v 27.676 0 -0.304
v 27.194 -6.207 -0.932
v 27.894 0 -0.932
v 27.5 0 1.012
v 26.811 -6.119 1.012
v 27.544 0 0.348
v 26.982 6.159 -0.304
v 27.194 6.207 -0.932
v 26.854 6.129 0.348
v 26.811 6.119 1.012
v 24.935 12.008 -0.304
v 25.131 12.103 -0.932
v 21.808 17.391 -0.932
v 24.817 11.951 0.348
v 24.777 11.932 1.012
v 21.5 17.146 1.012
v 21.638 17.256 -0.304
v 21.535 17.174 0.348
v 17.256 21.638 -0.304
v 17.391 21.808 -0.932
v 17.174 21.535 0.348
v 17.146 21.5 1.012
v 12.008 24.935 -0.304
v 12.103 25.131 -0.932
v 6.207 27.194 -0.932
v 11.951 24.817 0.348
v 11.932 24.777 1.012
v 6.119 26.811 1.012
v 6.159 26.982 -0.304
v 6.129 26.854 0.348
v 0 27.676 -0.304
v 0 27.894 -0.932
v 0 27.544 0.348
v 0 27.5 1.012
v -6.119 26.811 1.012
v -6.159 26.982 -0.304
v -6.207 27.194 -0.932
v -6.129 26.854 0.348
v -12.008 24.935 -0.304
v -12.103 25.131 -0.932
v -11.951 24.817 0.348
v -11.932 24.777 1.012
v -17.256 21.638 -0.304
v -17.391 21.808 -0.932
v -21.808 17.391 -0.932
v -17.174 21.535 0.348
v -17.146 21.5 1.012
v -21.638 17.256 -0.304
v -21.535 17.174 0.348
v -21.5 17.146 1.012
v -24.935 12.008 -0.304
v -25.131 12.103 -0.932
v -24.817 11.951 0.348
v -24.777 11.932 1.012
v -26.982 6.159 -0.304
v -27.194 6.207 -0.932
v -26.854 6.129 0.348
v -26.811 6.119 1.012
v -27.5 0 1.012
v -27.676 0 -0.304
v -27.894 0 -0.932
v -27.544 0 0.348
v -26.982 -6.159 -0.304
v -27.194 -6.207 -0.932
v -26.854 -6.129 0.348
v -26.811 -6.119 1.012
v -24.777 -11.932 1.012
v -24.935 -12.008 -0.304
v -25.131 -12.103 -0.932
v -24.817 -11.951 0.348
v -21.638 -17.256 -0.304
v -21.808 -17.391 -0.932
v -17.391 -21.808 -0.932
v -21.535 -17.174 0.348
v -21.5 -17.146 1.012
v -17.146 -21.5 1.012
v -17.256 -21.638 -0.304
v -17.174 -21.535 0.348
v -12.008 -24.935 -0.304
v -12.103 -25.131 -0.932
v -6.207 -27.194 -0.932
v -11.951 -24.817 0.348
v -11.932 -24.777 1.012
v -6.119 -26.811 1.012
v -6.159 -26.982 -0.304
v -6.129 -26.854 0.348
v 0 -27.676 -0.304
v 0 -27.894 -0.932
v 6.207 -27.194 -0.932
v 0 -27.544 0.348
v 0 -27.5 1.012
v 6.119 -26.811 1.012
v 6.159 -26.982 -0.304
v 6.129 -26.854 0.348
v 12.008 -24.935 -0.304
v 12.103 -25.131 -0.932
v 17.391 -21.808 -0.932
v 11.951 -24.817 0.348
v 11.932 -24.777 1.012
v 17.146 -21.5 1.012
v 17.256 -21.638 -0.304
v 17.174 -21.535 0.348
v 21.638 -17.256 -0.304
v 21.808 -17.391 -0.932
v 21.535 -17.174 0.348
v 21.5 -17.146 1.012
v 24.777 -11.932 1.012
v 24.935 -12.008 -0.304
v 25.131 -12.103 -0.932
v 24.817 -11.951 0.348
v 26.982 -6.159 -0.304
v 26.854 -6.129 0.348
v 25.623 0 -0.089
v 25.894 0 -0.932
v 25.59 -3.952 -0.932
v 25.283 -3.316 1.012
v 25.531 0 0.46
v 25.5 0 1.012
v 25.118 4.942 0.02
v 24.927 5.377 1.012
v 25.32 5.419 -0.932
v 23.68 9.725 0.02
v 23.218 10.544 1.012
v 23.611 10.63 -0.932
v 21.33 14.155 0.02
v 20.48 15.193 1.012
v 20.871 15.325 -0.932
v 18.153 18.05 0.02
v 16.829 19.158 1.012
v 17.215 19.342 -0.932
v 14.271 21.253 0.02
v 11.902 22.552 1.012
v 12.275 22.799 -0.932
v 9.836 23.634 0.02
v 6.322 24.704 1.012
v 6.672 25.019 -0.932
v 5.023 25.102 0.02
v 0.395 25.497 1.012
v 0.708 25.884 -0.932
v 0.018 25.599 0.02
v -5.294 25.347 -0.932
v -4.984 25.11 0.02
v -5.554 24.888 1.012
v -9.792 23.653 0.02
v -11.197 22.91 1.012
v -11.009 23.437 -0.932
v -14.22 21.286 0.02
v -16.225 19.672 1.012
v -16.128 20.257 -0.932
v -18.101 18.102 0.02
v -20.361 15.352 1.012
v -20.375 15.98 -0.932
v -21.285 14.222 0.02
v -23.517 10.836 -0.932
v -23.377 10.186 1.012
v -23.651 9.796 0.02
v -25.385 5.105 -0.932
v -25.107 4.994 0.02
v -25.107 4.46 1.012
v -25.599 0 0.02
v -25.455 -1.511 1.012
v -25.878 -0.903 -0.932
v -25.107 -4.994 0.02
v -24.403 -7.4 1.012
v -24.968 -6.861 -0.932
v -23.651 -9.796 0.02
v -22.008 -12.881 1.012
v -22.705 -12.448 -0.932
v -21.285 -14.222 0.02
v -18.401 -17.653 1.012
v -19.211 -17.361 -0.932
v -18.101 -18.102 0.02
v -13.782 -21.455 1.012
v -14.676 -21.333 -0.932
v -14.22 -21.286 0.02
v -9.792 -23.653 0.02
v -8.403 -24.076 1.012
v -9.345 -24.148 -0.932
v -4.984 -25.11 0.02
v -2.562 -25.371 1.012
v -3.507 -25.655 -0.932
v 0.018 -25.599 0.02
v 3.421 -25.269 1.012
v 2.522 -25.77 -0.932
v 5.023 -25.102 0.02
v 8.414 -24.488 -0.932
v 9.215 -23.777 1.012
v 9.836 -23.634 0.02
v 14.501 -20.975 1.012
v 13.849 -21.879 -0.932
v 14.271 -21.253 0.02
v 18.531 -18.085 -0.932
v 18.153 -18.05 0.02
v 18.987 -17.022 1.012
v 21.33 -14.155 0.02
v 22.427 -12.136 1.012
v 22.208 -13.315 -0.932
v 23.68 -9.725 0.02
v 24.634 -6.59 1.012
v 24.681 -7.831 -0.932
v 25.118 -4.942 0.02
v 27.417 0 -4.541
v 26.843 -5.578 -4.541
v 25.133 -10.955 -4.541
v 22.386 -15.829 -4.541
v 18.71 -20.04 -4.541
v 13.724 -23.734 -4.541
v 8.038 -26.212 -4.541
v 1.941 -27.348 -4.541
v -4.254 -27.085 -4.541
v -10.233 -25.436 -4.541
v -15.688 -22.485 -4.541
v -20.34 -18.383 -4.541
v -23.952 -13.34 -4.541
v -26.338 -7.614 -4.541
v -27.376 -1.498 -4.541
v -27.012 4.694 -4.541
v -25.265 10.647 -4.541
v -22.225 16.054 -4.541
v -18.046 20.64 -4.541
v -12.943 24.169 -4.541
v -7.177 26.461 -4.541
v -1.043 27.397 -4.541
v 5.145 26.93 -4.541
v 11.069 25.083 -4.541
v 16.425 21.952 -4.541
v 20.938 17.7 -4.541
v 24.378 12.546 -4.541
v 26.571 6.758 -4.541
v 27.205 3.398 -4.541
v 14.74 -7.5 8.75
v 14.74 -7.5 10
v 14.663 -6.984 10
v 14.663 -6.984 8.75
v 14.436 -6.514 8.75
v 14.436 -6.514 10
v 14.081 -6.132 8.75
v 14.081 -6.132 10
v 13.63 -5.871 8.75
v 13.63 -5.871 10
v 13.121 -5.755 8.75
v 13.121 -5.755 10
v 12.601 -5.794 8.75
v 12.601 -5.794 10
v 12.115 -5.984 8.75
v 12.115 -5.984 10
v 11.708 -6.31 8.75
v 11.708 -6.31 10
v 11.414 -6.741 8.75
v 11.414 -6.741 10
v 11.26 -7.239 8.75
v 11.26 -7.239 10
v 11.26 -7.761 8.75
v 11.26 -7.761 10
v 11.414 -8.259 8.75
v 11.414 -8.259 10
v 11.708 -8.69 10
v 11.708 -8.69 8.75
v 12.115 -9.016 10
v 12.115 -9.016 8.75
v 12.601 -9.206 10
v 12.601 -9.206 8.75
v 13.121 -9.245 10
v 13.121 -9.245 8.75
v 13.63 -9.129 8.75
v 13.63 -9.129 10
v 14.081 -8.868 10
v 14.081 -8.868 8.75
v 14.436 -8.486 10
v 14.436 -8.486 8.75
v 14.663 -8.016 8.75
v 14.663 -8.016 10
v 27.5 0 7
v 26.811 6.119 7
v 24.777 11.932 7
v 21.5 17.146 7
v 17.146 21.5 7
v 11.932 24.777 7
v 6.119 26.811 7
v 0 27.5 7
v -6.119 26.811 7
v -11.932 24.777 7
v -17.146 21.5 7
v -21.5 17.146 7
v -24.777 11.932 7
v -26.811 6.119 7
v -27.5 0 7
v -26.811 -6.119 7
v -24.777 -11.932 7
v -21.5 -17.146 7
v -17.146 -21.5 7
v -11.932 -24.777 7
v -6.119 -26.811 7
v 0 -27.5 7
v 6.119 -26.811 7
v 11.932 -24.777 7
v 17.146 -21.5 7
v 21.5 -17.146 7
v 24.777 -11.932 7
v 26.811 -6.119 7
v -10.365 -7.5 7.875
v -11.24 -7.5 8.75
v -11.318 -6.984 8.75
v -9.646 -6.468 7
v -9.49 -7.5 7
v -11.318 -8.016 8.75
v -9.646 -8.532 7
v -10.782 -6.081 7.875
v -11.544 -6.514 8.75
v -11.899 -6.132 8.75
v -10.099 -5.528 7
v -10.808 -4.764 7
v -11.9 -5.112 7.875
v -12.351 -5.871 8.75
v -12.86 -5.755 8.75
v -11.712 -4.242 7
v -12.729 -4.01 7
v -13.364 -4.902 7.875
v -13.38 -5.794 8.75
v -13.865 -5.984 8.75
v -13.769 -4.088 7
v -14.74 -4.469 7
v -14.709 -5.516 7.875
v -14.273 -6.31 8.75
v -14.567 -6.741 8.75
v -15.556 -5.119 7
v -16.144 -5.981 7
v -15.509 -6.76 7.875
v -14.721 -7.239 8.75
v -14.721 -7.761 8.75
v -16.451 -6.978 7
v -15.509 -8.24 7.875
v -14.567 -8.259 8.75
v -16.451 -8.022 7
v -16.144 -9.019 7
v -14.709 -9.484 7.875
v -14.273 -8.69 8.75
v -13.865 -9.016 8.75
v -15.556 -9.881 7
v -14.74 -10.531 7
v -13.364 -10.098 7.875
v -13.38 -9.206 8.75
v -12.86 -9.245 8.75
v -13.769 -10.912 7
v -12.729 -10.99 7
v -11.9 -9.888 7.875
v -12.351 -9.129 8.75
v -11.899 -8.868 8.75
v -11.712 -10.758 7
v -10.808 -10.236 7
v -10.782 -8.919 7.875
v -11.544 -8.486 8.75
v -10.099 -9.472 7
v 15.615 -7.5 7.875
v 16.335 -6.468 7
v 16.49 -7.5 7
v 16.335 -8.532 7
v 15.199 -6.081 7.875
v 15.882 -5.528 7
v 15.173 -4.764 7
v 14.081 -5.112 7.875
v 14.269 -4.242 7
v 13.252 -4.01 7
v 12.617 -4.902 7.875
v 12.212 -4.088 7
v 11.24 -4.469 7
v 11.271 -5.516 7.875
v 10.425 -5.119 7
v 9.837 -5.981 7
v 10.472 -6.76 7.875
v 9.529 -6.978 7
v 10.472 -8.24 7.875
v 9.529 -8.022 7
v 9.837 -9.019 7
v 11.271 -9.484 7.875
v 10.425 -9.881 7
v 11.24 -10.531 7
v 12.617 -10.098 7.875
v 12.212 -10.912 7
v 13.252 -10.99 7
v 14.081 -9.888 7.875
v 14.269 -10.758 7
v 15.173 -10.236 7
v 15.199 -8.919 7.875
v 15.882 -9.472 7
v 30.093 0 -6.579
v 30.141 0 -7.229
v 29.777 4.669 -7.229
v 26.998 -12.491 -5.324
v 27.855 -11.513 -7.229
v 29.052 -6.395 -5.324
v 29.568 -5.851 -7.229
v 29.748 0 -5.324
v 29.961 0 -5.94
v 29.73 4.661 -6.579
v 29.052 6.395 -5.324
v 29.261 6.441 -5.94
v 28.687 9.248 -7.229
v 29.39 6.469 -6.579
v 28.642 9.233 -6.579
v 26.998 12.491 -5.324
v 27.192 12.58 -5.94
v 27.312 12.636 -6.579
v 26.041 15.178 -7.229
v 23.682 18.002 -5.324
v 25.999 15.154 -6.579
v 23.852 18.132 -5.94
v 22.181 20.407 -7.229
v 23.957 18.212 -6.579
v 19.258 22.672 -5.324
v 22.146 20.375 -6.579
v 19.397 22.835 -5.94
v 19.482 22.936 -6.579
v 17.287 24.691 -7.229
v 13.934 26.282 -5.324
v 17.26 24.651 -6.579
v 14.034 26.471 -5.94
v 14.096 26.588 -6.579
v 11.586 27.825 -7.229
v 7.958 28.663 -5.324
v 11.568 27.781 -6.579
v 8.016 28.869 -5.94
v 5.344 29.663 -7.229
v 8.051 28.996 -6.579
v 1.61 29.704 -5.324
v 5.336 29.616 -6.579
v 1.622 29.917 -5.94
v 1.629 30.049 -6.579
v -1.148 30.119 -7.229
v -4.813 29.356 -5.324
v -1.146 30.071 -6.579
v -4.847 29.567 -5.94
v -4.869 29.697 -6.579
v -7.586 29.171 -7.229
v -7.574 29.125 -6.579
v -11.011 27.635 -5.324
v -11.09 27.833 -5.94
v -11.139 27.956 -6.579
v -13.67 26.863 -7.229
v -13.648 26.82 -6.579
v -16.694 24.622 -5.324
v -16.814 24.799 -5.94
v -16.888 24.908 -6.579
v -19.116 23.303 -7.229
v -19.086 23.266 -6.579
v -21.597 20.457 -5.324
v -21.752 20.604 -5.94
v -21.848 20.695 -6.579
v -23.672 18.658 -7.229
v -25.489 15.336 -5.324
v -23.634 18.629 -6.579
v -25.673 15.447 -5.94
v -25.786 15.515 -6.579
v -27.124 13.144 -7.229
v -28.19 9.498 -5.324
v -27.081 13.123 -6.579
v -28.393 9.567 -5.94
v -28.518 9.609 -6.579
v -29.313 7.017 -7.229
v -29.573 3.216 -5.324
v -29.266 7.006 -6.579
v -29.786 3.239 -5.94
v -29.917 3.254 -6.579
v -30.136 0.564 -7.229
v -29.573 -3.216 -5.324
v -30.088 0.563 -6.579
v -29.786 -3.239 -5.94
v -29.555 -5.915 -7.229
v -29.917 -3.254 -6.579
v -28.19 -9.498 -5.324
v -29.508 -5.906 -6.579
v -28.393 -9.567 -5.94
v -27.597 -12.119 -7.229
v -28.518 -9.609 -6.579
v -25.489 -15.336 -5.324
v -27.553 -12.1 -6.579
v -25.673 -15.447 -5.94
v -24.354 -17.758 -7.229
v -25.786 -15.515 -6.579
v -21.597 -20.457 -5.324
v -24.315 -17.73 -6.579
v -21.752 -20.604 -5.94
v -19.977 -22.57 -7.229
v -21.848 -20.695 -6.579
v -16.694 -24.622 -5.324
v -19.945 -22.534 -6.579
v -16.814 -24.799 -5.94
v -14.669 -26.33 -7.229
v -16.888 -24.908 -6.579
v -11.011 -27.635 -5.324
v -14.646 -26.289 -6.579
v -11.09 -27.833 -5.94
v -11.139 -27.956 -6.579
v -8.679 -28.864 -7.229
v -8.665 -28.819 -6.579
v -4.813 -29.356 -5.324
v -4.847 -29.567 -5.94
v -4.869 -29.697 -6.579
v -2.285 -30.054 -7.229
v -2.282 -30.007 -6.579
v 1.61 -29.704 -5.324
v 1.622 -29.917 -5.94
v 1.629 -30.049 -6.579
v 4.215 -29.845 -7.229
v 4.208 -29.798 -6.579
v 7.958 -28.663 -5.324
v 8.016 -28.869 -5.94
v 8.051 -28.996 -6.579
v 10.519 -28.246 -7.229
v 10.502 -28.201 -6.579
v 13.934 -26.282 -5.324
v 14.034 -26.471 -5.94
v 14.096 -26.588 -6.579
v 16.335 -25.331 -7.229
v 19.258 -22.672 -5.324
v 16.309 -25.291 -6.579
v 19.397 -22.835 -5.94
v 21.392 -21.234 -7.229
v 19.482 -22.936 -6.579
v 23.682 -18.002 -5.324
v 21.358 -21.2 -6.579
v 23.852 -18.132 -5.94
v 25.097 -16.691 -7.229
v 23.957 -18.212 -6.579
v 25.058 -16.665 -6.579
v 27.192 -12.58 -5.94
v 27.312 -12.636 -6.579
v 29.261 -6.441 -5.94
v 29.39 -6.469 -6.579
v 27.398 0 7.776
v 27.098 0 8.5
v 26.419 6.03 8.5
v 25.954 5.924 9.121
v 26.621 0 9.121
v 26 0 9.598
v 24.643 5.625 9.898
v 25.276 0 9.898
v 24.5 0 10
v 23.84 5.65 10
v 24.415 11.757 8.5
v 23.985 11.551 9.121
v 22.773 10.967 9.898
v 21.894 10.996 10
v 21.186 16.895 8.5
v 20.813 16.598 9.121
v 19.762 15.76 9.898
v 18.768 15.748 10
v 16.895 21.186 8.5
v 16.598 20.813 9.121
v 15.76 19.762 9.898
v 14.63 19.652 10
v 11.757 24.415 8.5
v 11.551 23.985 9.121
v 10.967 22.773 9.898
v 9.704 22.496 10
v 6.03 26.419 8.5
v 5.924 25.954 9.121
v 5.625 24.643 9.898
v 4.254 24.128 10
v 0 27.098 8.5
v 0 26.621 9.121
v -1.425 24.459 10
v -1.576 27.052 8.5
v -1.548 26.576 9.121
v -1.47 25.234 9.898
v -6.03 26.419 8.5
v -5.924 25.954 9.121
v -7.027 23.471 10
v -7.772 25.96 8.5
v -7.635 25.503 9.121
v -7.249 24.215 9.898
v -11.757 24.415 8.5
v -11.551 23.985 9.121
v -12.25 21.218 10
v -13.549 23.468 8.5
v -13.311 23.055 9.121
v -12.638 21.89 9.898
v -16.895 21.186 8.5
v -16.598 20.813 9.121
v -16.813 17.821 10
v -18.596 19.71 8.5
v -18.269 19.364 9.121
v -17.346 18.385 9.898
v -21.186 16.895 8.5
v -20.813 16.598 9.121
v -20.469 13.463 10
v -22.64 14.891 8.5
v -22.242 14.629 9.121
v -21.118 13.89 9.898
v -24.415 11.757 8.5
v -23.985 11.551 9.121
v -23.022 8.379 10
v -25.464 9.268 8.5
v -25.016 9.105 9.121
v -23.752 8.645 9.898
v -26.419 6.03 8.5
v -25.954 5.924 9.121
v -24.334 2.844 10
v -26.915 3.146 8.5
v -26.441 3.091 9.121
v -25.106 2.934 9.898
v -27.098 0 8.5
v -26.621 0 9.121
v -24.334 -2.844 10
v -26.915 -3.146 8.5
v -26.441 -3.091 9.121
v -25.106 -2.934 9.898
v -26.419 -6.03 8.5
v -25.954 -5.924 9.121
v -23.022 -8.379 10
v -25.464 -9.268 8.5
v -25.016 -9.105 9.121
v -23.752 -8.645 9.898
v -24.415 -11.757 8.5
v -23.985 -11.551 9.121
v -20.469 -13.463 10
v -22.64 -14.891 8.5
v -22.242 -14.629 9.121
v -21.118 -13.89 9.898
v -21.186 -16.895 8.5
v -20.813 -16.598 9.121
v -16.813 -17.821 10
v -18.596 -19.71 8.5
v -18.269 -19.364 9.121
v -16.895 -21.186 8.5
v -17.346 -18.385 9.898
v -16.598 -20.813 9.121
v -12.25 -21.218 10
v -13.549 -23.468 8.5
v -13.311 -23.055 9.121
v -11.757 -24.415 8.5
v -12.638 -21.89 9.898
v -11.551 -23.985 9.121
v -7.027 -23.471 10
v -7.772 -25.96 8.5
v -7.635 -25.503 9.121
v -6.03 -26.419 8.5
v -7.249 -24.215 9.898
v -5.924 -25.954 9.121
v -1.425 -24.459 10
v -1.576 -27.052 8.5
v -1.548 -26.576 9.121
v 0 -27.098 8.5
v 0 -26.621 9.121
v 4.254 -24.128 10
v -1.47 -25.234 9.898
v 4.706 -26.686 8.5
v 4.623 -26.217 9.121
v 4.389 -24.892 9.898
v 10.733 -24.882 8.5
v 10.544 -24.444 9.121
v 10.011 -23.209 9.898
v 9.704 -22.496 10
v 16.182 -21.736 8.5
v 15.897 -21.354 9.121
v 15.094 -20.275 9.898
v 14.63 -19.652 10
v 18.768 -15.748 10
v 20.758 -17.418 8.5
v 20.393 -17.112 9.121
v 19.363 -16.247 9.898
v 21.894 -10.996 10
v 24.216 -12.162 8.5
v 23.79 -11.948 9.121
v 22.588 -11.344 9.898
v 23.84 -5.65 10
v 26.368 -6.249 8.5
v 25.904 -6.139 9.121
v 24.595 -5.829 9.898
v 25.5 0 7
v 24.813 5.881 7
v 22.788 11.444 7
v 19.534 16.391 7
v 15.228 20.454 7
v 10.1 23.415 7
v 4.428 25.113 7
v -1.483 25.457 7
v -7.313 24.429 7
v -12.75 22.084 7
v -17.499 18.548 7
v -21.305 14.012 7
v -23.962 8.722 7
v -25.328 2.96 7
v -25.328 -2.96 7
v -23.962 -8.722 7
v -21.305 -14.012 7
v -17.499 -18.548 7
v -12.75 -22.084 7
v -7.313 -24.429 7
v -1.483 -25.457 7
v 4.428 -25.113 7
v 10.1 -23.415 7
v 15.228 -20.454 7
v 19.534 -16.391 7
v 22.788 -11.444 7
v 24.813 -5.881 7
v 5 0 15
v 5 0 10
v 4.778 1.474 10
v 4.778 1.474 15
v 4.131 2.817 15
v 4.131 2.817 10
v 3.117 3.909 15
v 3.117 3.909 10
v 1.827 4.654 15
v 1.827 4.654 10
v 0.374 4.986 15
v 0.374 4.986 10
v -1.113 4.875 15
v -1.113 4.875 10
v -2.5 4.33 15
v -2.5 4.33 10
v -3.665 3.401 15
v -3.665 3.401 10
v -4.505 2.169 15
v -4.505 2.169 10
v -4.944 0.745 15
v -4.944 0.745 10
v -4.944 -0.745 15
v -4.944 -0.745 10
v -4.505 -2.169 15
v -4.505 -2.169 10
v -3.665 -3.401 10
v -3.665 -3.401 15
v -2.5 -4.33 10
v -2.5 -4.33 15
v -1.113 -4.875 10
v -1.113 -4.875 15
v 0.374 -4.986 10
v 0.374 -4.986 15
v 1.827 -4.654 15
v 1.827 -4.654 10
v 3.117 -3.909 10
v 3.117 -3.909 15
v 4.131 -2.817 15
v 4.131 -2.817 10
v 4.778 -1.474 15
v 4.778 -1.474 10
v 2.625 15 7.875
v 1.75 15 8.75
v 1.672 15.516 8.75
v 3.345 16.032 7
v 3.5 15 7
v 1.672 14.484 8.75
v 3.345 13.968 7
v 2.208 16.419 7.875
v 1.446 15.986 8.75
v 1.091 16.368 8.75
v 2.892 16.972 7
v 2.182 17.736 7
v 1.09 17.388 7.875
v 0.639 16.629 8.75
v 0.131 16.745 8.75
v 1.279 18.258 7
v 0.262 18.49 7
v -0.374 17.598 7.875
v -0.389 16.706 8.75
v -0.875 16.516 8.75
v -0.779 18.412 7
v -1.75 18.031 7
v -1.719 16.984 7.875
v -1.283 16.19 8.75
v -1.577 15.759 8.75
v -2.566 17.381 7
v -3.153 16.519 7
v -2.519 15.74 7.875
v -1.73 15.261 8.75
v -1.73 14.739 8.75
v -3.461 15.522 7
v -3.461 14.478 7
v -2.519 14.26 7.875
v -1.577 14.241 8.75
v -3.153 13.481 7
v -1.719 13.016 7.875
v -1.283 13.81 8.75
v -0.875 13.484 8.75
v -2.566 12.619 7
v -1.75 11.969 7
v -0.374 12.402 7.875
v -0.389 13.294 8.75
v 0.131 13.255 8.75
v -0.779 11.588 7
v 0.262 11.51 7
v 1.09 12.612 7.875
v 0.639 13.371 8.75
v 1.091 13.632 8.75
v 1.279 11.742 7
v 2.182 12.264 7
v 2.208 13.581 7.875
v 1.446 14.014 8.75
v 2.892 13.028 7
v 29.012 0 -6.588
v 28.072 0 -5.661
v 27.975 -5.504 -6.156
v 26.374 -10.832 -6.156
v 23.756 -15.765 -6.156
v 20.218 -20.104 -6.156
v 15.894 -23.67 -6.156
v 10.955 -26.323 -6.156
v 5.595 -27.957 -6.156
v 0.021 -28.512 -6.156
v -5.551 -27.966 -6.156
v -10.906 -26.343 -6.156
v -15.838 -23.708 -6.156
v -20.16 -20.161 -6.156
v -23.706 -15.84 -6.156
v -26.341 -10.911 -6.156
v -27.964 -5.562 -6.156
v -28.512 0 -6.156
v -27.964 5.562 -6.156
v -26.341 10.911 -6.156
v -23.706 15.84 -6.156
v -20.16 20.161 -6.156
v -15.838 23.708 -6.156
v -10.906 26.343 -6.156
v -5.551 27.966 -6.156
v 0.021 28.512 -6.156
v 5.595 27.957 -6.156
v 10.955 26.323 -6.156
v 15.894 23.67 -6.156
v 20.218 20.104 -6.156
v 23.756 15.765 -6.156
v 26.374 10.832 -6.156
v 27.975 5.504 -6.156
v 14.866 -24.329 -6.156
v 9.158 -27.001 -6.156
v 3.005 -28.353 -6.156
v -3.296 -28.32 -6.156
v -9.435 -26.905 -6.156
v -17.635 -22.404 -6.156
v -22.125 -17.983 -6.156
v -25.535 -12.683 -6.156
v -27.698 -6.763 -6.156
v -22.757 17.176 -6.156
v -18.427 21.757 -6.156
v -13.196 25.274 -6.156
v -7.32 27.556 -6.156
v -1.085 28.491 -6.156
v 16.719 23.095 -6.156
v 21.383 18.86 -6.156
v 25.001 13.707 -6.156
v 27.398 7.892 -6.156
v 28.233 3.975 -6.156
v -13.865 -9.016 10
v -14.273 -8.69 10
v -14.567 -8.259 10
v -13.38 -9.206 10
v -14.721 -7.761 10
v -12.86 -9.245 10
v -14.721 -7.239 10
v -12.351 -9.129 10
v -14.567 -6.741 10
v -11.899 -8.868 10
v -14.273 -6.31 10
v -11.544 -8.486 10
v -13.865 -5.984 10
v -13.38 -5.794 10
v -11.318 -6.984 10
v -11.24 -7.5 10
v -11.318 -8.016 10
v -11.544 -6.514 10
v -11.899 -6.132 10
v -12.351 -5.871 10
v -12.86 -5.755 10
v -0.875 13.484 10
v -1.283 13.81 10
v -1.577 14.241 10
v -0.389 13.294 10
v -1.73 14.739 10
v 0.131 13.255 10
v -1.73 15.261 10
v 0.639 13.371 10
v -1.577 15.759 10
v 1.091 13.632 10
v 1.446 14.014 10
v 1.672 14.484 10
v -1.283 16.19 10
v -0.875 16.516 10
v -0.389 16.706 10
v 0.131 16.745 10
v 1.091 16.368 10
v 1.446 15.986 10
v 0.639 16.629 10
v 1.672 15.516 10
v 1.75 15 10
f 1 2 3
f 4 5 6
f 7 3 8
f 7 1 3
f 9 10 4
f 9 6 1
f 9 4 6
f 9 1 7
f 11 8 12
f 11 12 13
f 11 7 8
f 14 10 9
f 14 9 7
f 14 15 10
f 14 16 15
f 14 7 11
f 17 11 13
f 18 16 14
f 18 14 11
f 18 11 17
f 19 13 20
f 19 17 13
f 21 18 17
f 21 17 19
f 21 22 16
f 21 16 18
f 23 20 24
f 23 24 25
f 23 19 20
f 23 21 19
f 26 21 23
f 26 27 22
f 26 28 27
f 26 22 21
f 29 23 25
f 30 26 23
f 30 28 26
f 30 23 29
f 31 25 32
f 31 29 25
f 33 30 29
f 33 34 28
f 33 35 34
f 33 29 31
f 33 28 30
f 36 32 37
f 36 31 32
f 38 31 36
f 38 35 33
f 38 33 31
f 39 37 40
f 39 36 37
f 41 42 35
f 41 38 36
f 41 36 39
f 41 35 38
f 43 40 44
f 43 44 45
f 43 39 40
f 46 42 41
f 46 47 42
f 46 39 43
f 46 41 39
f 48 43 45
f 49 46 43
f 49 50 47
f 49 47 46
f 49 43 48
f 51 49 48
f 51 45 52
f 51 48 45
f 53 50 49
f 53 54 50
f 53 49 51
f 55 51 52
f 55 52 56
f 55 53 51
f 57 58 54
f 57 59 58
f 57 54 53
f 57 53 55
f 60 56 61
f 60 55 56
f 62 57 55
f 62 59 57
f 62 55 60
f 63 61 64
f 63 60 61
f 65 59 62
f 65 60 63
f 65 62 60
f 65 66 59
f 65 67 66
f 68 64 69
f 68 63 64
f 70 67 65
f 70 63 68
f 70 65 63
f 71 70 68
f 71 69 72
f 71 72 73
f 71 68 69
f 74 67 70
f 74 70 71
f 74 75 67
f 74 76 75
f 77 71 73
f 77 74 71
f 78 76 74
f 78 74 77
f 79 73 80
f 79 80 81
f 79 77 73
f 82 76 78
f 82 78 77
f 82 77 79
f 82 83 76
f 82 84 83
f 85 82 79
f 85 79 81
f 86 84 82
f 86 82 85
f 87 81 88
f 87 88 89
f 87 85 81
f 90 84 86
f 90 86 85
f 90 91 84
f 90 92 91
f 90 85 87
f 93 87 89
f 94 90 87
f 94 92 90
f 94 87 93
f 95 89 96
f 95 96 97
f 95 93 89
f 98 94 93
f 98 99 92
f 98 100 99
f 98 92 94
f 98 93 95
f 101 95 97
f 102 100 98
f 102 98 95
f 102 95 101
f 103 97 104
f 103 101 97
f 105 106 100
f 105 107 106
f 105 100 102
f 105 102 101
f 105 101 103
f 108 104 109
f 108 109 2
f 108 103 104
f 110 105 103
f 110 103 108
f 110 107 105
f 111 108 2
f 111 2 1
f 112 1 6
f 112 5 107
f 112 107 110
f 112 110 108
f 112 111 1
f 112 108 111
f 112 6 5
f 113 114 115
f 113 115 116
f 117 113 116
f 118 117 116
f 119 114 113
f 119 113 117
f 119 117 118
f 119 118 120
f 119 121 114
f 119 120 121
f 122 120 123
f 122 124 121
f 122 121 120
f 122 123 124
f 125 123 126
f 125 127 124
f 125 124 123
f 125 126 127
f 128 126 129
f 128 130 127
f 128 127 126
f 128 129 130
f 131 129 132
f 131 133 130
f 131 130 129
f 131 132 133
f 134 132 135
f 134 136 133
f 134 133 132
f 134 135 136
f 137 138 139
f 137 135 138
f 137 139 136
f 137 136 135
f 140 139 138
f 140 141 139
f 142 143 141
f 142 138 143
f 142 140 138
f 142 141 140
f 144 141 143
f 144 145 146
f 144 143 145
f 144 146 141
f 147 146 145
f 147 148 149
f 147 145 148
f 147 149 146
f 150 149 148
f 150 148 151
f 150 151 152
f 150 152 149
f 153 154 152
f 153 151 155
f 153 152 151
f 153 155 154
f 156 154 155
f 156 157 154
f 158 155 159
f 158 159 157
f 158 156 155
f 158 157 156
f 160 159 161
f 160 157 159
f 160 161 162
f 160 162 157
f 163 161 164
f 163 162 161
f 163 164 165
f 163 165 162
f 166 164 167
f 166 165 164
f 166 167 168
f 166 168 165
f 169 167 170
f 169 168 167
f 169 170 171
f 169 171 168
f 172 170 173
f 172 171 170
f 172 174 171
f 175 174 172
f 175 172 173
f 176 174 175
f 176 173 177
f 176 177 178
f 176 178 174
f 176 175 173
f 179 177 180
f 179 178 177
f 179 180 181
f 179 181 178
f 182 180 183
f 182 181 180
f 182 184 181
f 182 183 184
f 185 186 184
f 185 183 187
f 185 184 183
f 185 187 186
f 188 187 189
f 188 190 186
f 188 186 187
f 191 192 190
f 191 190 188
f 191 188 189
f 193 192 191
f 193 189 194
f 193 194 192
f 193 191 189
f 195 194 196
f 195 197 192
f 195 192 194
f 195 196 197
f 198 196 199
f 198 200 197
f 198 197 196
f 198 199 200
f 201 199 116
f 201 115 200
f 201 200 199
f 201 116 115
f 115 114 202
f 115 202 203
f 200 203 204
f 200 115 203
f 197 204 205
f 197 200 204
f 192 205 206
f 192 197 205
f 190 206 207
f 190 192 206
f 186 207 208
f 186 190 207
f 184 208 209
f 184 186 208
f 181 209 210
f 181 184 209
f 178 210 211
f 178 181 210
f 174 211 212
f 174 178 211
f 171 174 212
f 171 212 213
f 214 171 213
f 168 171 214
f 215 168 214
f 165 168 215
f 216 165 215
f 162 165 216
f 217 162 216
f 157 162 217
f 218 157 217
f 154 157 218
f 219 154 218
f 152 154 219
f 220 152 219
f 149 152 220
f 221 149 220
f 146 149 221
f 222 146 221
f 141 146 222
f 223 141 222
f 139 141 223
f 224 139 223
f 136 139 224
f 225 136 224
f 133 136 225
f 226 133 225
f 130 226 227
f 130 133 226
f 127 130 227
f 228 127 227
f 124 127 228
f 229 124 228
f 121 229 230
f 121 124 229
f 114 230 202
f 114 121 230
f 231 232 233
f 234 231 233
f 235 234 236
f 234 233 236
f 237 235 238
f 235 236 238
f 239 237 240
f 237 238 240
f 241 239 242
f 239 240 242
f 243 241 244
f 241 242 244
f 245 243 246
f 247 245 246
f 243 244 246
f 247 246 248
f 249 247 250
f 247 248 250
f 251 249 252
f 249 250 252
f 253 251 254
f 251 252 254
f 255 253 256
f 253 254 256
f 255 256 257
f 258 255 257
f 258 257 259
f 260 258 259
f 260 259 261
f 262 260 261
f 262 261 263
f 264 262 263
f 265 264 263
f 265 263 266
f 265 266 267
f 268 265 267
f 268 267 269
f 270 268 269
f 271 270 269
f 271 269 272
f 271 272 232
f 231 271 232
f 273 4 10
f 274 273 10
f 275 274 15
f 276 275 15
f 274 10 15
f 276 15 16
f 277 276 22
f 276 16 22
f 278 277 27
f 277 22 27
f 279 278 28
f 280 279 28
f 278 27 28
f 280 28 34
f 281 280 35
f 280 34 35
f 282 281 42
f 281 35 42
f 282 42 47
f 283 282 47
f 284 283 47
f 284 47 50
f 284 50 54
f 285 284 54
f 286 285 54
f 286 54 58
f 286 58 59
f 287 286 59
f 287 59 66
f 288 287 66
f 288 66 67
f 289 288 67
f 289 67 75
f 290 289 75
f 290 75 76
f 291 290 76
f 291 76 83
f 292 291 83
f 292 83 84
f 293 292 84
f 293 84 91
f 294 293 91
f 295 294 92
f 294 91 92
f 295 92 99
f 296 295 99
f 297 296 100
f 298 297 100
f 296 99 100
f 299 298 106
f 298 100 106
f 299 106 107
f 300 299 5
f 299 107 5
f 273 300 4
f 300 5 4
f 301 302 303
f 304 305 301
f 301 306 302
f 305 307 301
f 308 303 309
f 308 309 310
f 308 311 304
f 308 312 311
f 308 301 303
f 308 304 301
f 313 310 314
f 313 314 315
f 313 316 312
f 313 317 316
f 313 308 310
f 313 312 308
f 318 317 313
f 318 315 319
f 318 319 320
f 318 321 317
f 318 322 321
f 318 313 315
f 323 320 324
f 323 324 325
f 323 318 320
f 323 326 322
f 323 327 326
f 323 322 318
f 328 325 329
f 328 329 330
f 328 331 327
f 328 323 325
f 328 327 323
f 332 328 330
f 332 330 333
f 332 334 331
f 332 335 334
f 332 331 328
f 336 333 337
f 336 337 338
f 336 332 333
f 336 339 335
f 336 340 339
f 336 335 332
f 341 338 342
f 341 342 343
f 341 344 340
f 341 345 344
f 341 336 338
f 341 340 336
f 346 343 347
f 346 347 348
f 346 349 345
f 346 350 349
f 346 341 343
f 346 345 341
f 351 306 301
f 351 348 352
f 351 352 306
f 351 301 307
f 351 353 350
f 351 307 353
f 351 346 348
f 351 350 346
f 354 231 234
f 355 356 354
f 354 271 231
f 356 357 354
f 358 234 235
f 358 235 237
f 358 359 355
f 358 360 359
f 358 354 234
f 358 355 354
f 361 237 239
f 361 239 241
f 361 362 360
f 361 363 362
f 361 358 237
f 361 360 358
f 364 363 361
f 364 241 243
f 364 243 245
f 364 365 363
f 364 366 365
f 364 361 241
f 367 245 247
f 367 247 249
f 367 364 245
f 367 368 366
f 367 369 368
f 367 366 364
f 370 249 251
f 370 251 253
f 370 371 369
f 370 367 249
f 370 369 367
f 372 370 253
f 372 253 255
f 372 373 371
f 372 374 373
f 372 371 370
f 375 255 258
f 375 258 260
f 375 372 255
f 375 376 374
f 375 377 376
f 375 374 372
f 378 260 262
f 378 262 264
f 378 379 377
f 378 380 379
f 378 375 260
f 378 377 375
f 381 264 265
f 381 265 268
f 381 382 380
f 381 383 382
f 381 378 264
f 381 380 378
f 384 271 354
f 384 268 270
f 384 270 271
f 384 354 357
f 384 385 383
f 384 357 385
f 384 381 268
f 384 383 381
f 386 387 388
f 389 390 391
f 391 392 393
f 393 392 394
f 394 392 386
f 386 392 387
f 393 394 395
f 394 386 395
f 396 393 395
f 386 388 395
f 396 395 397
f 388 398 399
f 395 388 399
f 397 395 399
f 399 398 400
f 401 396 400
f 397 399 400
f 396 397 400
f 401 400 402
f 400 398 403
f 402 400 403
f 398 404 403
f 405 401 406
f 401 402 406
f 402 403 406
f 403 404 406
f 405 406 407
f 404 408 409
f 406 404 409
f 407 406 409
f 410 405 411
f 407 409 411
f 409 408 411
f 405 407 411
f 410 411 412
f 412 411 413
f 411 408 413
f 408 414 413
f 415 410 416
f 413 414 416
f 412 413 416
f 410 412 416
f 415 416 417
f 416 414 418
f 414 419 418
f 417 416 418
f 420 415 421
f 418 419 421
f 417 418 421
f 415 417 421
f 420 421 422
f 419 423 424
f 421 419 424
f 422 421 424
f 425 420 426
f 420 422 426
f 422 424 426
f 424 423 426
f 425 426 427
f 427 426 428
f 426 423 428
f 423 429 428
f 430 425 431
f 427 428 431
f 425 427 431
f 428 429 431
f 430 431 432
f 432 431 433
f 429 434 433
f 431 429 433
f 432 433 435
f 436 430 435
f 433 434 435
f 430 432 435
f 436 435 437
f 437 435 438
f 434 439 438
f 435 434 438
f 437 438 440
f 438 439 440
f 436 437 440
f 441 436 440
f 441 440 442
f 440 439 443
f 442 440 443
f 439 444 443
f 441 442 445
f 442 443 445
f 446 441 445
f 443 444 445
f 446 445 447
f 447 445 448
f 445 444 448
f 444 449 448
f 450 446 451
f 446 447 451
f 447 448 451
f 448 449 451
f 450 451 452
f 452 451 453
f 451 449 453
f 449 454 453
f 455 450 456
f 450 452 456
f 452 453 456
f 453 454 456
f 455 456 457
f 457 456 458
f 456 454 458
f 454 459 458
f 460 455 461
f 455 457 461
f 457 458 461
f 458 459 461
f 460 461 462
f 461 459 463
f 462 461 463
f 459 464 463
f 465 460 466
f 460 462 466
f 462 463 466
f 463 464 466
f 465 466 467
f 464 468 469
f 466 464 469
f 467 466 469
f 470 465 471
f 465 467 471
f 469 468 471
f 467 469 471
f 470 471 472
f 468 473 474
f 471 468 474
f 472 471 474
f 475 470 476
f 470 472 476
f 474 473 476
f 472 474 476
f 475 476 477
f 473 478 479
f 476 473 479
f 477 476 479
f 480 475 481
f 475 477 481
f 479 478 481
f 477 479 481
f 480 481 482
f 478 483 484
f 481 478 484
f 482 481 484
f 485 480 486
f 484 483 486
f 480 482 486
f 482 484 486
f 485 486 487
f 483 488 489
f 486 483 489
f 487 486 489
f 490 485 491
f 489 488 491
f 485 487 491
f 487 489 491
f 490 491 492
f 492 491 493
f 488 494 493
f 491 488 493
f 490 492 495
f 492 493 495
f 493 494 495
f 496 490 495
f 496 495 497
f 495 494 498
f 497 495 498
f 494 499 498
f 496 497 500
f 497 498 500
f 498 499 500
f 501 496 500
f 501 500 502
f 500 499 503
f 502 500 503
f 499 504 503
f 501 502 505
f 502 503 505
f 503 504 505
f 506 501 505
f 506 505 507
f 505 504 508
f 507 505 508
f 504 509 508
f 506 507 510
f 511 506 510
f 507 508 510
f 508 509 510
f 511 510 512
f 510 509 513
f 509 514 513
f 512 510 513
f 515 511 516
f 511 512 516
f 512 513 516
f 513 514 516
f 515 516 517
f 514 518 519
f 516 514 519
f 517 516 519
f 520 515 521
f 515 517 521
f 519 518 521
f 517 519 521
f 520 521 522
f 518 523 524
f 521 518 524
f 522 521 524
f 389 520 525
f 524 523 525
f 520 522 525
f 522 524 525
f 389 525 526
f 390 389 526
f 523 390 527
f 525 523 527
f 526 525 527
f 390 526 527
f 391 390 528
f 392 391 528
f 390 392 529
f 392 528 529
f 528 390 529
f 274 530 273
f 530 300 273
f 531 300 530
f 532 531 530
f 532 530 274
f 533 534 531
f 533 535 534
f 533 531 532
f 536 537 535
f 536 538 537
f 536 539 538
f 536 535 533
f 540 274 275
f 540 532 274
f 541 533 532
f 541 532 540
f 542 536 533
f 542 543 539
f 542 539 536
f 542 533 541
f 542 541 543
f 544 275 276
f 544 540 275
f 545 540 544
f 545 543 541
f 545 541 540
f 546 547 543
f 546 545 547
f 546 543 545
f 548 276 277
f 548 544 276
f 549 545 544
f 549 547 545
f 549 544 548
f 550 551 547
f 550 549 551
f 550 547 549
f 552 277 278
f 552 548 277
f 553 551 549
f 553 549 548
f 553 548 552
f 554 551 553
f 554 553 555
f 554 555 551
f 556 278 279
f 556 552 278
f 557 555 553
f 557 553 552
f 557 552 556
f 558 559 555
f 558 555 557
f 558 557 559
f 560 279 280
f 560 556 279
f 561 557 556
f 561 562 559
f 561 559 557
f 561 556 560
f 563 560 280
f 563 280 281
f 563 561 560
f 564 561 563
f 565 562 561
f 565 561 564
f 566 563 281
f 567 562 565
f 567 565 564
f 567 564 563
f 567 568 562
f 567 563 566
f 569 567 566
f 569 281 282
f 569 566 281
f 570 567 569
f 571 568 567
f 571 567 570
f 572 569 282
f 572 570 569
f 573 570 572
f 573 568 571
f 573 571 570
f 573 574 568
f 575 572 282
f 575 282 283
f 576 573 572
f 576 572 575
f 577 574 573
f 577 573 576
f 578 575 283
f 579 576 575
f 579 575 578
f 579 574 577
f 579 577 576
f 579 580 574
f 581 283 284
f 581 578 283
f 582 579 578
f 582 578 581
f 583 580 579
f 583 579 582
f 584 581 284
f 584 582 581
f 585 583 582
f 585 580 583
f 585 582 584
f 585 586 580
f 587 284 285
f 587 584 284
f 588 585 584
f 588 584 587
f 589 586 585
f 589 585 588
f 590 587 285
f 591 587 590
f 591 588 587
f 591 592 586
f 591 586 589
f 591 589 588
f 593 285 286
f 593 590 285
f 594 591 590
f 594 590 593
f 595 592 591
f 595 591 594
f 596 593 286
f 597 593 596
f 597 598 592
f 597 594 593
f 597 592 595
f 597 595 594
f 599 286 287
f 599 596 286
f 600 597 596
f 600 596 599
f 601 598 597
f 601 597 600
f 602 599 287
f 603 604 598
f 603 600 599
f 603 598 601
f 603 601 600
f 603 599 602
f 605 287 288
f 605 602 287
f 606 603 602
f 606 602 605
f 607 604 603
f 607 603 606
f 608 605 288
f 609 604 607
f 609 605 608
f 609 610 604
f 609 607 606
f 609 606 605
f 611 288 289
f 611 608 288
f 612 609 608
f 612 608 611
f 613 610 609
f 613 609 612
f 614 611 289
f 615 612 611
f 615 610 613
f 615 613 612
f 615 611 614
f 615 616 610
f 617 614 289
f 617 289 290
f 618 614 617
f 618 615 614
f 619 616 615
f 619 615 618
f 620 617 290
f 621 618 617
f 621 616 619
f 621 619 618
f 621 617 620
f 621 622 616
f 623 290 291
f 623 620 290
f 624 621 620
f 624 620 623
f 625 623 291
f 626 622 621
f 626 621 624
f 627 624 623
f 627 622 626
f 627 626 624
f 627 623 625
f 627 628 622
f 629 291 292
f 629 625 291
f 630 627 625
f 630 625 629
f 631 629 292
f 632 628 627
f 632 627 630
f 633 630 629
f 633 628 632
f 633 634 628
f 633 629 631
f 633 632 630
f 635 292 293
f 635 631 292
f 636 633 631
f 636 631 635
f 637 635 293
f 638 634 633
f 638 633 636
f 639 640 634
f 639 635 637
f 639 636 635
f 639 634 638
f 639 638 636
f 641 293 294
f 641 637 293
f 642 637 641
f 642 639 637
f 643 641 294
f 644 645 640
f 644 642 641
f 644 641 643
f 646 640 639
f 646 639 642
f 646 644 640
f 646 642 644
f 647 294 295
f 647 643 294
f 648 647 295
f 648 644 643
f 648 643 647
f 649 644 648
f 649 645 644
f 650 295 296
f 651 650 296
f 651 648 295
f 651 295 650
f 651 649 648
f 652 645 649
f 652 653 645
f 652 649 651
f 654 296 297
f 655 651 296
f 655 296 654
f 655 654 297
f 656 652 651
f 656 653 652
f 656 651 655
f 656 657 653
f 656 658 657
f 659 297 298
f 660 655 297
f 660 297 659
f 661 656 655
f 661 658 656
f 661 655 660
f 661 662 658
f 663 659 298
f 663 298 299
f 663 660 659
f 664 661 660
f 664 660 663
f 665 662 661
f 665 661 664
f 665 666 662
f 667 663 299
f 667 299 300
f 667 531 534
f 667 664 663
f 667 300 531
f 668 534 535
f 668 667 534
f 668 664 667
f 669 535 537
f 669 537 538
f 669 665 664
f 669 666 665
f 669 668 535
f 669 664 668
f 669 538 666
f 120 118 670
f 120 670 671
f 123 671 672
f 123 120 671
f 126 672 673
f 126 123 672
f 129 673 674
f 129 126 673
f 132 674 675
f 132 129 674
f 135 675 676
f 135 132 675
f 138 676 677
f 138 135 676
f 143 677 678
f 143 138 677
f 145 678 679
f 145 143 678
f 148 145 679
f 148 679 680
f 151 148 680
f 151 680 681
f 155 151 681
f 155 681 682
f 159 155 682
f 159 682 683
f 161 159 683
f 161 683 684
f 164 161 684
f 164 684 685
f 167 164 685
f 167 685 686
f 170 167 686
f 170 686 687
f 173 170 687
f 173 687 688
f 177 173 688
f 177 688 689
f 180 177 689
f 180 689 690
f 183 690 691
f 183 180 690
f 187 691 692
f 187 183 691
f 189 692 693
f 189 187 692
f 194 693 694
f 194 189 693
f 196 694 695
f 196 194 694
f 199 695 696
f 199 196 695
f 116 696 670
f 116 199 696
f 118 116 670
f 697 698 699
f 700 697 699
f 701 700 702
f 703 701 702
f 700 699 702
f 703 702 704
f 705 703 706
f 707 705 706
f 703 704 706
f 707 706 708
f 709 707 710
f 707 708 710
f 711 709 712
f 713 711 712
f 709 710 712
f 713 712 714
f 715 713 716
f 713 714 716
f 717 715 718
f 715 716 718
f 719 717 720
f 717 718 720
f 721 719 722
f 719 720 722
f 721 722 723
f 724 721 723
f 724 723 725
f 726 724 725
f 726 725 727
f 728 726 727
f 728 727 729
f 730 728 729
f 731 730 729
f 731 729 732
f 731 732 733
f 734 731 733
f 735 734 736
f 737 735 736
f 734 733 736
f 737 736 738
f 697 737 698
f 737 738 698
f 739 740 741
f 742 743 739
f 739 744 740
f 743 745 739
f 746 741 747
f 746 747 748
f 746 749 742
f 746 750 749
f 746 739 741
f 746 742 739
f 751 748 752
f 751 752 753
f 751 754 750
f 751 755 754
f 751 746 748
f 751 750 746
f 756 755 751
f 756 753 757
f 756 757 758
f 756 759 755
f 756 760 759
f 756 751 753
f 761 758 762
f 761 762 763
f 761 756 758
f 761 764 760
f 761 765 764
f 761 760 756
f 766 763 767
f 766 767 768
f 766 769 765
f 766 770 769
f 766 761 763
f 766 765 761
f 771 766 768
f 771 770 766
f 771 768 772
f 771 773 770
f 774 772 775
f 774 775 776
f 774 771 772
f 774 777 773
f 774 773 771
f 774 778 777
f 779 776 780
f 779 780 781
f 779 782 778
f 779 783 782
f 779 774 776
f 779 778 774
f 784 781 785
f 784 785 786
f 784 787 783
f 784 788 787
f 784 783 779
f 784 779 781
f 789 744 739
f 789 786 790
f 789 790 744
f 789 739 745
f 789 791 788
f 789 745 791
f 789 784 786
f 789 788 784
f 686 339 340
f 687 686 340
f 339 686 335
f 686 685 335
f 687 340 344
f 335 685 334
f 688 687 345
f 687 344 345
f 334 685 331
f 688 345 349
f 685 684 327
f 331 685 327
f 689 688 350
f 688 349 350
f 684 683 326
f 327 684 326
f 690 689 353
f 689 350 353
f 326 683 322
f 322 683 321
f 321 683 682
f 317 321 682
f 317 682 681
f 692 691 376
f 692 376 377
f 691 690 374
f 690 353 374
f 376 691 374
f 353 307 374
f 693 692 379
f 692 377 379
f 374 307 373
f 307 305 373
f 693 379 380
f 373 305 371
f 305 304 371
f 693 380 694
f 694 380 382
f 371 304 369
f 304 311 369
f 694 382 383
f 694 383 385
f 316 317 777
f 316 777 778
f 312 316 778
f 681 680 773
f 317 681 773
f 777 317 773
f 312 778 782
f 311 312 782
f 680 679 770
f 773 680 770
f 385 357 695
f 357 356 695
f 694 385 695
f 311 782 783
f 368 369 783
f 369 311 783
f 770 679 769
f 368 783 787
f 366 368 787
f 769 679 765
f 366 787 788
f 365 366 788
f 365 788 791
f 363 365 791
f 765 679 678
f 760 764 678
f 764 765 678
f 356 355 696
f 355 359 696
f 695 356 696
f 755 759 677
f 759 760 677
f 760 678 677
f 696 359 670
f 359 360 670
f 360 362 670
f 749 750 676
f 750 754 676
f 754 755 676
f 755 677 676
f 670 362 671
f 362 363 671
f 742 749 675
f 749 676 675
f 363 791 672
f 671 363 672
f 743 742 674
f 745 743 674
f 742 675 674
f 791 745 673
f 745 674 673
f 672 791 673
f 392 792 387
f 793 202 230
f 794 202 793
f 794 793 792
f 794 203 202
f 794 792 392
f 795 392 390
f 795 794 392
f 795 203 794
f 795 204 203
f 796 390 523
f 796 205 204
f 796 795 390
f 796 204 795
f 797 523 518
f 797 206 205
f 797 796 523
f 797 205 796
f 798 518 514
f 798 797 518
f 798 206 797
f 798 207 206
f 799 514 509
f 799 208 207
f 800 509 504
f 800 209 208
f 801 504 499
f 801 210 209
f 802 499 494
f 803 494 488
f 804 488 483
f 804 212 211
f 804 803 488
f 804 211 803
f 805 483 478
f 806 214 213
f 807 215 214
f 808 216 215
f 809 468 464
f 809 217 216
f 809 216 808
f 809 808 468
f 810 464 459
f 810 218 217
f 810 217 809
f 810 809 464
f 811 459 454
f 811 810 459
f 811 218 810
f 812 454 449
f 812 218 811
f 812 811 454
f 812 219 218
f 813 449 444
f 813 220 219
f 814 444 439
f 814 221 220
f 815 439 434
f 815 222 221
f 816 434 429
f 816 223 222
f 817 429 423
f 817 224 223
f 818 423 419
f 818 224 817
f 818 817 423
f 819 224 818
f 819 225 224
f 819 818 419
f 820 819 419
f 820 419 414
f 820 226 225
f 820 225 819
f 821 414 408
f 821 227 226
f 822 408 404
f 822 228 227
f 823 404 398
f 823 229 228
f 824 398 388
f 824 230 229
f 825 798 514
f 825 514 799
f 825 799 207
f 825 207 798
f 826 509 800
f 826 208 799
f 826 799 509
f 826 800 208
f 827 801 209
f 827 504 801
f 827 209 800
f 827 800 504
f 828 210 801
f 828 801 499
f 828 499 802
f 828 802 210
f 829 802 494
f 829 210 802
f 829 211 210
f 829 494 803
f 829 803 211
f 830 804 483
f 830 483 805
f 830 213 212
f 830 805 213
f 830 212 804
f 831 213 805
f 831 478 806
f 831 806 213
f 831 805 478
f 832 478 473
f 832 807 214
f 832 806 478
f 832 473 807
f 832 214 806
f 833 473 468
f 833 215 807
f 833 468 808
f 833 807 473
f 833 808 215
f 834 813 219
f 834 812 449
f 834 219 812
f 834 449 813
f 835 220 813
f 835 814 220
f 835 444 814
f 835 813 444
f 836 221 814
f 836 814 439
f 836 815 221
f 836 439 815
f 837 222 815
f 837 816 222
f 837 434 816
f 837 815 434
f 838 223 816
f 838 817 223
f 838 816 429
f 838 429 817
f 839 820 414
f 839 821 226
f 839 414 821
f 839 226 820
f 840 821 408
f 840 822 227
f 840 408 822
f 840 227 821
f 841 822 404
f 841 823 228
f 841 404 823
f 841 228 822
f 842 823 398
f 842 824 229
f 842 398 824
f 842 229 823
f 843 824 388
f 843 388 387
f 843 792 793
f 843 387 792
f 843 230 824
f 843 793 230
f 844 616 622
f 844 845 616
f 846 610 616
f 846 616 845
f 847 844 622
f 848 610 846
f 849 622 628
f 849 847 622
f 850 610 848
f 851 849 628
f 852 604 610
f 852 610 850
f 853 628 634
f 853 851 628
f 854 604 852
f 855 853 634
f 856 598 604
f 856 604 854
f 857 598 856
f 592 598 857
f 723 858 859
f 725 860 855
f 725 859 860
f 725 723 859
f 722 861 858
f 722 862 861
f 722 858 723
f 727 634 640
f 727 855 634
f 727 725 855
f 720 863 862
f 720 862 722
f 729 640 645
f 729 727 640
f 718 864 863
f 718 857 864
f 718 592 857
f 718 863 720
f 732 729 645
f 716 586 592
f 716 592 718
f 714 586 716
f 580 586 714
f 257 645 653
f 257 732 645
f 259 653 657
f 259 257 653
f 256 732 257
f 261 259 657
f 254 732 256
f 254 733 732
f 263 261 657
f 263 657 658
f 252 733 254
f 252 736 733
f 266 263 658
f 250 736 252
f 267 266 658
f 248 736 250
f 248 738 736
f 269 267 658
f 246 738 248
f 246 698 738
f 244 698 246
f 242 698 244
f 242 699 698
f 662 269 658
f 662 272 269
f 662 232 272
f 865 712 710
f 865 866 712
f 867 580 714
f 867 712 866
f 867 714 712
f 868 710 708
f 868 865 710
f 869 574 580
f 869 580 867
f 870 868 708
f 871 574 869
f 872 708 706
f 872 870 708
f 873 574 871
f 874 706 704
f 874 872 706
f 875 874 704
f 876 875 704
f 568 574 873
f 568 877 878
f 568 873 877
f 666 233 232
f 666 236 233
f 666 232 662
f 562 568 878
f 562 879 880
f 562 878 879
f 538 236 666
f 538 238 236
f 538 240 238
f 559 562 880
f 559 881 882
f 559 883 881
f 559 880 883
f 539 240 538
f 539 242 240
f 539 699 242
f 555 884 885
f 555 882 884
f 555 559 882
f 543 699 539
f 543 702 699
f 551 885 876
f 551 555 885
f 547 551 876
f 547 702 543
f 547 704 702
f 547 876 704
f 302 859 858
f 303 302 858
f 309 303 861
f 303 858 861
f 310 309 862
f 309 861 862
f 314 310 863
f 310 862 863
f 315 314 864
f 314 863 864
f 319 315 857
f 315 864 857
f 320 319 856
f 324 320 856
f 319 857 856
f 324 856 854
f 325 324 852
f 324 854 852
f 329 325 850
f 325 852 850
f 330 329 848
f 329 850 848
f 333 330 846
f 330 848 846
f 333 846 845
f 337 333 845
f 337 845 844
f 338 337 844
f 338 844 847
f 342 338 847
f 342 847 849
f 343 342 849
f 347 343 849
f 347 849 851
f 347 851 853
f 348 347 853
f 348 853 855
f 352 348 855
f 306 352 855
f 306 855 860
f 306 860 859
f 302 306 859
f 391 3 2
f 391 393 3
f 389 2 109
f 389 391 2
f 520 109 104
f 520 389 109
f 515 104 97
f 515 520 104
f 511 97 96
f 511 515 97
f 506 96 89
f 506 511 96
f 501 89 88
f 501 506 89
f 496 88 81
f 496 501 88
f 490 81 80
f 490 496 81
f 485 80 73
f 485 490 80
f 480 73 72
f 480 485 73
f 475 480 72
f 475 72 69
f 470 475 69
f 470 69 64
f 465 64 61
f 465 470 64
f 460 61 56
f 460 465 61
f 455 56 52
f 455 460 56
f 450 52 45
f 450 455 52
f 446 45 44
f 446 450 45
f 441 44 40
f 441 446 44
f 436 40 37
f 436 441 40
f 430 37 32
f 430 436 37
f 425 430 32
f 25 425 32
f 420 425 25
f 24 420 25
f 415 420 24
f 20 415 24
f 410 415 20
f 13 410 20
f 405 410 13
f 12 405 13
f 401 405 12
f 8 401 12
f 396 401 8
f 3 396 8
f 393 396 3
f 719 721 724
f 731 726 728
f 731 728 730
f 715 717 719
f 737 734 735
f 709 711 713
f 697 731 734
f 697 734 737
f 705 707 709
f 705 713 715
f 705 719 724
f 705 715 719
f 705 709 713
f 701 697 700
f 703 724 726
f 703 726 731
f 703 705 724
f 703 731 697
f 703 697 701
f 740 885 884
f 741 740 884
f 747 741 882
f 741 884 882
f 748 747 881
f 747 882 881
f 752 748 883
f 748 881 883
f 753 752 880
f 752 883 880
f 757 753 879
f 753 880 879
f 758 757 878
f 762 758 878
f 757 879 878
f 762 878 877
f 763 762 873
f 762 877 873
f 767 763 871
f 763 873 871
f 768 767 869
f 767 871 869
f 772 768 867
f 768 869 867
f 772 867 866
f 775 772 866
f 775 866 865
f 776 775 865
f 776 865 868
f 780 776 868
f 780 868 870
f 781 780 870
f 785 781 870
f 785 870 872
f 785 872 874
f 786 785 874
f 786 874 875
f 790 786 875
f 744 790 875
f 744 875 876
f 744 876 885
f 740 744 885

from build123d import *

# Parameters (mm, degrees)
SKETCH_1_R          = 27.5
SKETCH_1_R_2        = 25.5
EXTRUDE_1_DEPTH     = 10
EXTRUDE_START       = -3
SKETCH_2_R          = 27.5
EXTRUDE_2_DEPTH     = 3
FILLET_1_R          = 3
SKETCH_3_R          = 5
EXTRUDE_3_DEPTH     = 5
SKETCH_4_R          = 1.75
CUT_EXTRUDE_1_DEPTH = 10
CHAMFER_1_SIZE      = 1.75
FILLET_2_R          = 5
CHAMFER_2_SIZE      = 2
CHAMFER_2_SIZE_2    = 3.756603815
FILLET_3_R          = 5


with BuildPart() as part:
    # 草图1 → 凸台-拉伸1 (new body)
    with BuildSketch(Plane.XY):
        Circle(SKETCH_1_R)
        Circle(SKETCH_1_R_2, mode=Mode.SUBTRACT)
    extrude(amount=EXTRUDE_1_DEPTH)

    # 草图2 → 凸台-拉伸2 (add)
    with BuildSketch(Plane.XY.offset(10).offset(EXTRUDE_START)):
        Circle(SKETCH_2_R)
    extrude(amount=EXTRUDE_2_DEPTH)

    # 圆角1
    fillet_1_edges = [part.edges().sort_by_distance(p)[0] for p in [
        (-27.5, 0, 10),
    ]]
    fillet(fillet_1_edges, radius=FILLET_1_R)

    # 草图3 → 凸台-拉伸3 (add)
    with BuildSketch(Plane.XY.offset(10)):
        Circle(SKETCH_3_R)
    extrude(amount=EXTRUDE_3_DEPTH)

    # 草图4 → 切除-拉伸1 (cut)
    with BuildSketch(Plane.XY.offset(10)):
        with Locations((0, 15)):
            Circle(SKETCH_4_R)
        with Locations((12.990381057, -7.5)):
            Circle(SKETCH_4_R)
        with Locations((-12.990381057, -7.5)):
            Circle(SKETCH_4_R)
    extrude(amount=-CUT_EXTRUDE_1_DEPTH, mode=Mode.SUBTRACT)

    # 倒角1
    chamfer_1_edges = [part.edges().sort_by_distance(p)[0] for p in [
        (-1.75, 15, 7),
        (11.240381057, -7.5, 7),
        (-14.740381057, -7.5, 7),
    ]]
    chamfer(chamfer_1_edges, length=CHAMFER_1_SIZE)

    # 草图5 → 旋转1 (revolve)
    with BuildSketch(Plane(origin=(0, 0, 0), x_dir=(1, 0, 0), z_dir=(0, 1, 0))):
        Polygon((27.5, 0), (31, 8.291561976), (29, 8.291561976), (25.5, 0), align=None)
    revolve(axis=Axis((0, 0, 15), (0, 0, -1)))

    # 圆角2
    fillet_2_edges = [part.edges().sort_by_distance(p)[0] for p in [
        (-25.5, 0, 0),
    ]]
    fillet(fillet_2_edges, radius=FILLET_2_R)

    # 倒角2
    # the kernel refuses this chamfer: 3.756603815, 2 mm, written as the material it takes off along each edge
    with BuildSketch(Plane(origin=(0, 0, -8.291561976), x_dir=(1, 0, 0), z_dir=(0, 1, 0))) as chamfer_2_piece_1:
        Polygon((29 - CHAMFER_2_SIZE * 0.388888888889, -CHAMFER_2_SIZE * 0.921284663988), (29 + CHAMFER_2_SIZE_2, 0), (29, 0), align=None)
    revolve(axis=Axis((0, 0, -8.291561976), (0, 0, -1)), mode=Mode.SUBTRACT)

    # 圆角3
    fillet_3_edges = [part.edges().sort_by_distance(p)[0] for p in [
        (-28.222222222, 0, -6.448992648),
    ]]
    fillet(fillet_3_edges, radius=FILLET_3_R)

    # 圆角4: read off the stored shape, not the designer's step
    # 圆角4 outline → 圆角4 (revolve, cut)
    with BuildSketch(Plane.XZ):
        with BuildLine():
            Line((30.636307825, -5.324394926), (29.747511663, -5.324394926))
            ThreePointArc((29.747511663, -5.324394926), (30.037682192, -6.257222508), (30.140926968, -7.228668209))
            Line((30.140926968, -7.228668209), (30.636307825, -7.429968773))
            Line((30.636307825, -7.429968773), (30.636307825, -5.324394926))
        make_face()
    revolve(axis=Axis((0, 0, 0), (0, 0, 1)), mode=Mode.SUBTRACT)

    # Fillet 4 2 outline → Fillet 4 2 (revolve)
    with BuildSketch(Plane.XZ):
        with BuildLine():
            Line((27.5, -0.932390124), (27.89357668, -0.932390124))
            ThreePointArc((27.89357668, -0.932390124), (27.599381845, 0.020115965), (27.5, 1.01205432))
            Line((27.5, 1.01205432), (27.5, -0.932390124))
        make_face()
    revolve(axis=Axis((0, 0, 0), (0, 0, 1)))


solid = part.part
